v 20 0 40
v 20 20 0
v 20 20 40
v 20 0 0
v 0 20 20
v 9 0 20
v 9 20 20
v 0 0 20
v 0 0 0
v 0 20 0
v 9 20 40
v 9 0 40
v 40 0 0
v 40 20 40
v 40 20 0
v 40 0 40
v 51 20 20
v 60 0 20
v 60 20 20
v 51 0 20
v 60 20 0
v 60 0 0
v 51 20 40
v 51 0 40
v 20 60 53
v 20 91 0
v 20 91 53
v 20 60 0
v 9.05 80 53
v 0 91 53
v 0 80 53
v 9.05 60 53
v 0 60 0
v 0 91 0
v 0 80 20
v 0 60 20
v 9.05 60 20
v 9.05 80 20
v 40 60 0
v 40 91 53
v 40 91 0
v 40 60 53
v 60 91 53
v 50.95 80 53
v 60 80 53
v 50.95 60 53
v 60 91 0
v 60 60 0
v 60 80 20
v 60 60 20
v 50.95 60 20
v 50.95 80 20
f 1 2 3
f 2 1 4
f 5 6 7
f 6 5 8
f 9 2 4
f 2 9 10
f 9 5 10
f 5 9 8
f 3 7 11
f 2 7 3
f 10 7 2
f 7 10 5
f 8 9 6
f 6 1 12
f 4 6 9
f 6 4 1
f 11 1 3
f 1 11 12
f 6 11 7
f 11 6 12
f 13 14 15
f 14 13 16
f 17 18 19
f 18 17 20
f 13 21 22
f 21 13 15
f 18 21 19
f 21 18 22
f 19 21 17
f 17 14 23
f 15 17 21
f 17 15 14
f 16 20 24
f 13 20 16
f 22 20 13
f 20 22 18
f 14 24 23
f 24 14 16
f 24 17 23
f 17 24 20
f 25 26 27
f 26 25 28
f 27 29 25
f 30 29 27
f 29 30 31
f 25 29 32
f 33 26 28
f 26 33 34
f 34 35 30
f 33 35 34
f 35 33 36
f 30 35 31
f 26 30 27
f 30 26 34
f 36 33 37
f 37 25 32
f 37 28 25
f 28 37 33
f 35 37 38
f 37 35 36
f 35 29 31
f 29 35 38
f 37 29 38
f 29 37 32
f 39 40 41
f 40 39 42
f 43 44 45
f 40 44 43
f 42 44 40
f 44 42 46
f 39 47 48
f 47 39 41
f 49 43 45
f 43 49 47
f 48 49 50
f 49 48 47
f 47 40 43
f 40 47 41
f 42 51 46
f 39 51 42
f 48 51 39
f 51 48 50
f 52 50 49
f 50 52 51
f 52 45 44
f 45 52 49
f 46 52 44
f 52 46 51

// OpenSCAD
// file: door-servo-measurements.scad
boxSize=[640, 350, 500];
//boxSize=[280, 150, 220];
boxWallThickness=11;
boxCableM=20;

perspexBorderSize=8;
perspexThickness=3;

doorWoodBorder=60;
doorWoodHingeBorder=58 + 12;
doorWoodBorderRadius=10;
doorWoodThickness=16;
acsButtonM=20.2;
acsLargeModuleSize=[50.12, 65.47];
acsNfcModuleSize=[40,40];
acsModuleBorder=0.1;
acsLidWidth=110;

nfcLogoSize=[28.753704,28.782331];

strokeSize=20;
clipSize=20;
clipWall=5;
doorWall=3;
doorClipGap=3;
boltM=3;
smallBoltM=2;
boltHeadM=5;
boltNutM=5.9;
boltHeadHeight=3;
boltHeatInsertM=4.5;
boltHeatInsertLength=5.67;
lockBoltCurveR=1.5;

cabinetHingeDoorBoltOffsetHeight=48/2;
cabinetHingeDoorBoltOffsetLength=7 - 1.5/2;
cabinetHingeDoorMetalThickness=0.8;
cabinetHingeDoorInsetM=35;
cabinetHingeDoorInsetDepth=12;
cabinetHingeDoorInsetFace=2.5;
cabinetHingeDoorInsetWidth=25.5;
cabinetHingeDoorInsetLengthOffset=3;
cabinetHingeDoorInsetOuterRadius=4;
cabinetHingeDoorBoltChamferM=8;

cabinetHingeFrameBoltOffsetHeight=16;
cabinetHingeFrameBoltOffsetDepth=25 - cabinetHingeDoorInsetFace;
cabinetHingeFrameSize=[27,46, 16];
cabinetHingeFrameInsetFace = 2.8;
cabinetHingeFrameSpacerCorrection=1.6;
cabinetHingeFrameCornerRadius = 4;
cabinetHingeFrameHoleOne=6;
cabinetHingeFrameHoleTwoExtraOffset = 14;
cabinetHingeFrameHoleTwo=cabinetHingeFrameHoleOne + cabinetHingeFrameHoleTwoExtraOffset;
cabinetHingeFrameLargeChamferSize=[8,12];

cabinetHingeDoorPlate=[19.3,60];

boltPlate = boltM * 3;

gapToMove = 0.25;
gapToFit = 0.1;
doorSize=[200,150];
doorLatchPannel=3 * boltM;
doorLatchRounding=2;

servoHeight = 22.5;
servoDrivePlateHeight = 4;
servoSpindleHeight = 3;
servoSpindleOffset = 5.5;
servoWidth = 12.2;
servoLength = 23;
servoArmM=10;
servoSpindleM=4.8;

servoMountPlateLength=32.2;
servoMountPlateOffset=16.75;
servoMountPlateThickness=2;
servoMountPlateExtends = (servoMountPlateLength - servoLength) / 2;
servoMountHoleOffset = 2;
servoMountHoleM = 2;

switchThickness = 9.7;
switchCornerR=4;
switchHoleM=3;
switchLength=27.9;
switchWidth=15.96;
switchRollerOut=9;
switchRollerIn=6.5;
switchRollerM=4.6;
switchRollerTopOffset=3.3;
switchRollerThickness = switchThickness - 2 * 2.5;

leaverSwitchThickness=6.36;
leaverSwitchWidth=9.92;
leaverSwitchLength=20.15;
leaverSwitchCornerR=1;
leaverOffset=3;
leaverExtension=11.5;
leaverThickness = 1;
leaverWidth=4.28;
leaverSwitchContactLength=5;
leaverSwitchContactOffset=1.5;

thinWall=1;
ferrousSheet=1;
magnetM=5;

initialAngle = 20;
deltaAngle = 66.5;

bleepHolesOffset=110-56;

handleDepth=45;
handleWall=2;

feetSize=20;
// main file
include <door-servo-measurements.scad>

module frontFoot() {
    union() {
        cube([feetSize, feetSize, feetSize]);
        translate([feetSize - boxWallThickness, 0, feetSize]) {
            cube([boxWallThickness, feetSize, feetSize]);
        }
    }
}

module backFoot() {
    difference() {
        cube([feetSize, feetSize + 1 * boxWallThickness, feetSize + 3 * boxWallThickness]);
        translate([-0.01, -0.01, feetSize]) {
            cube([feetSize - 1 * boxWallThickness + 0.01, feetSize + 0 + 0.01, boxWallThickness + gapToFit]);
        }

        translate([feetSize - 2 * boxWallThickness - gapToFit / 2, -0.01, feetSize]) {
            cube([boxWallThickness + gapToFit, feetSize + 0 + 0.01, 3 * boxWallThickness + 0.01]);
        }

        
    }
}

frontFoot();

translate([3 * feetSize, 0,0]) {
    mirror([1, 0, 0]) frontFoot();
}

translate([0, 3 * feetSize, 0]) {
    backFoot();
}

translate([3 * feetSize, 3 * feetSize, 0]) {
    mirror([1, 0, 0]) backFoot();
}
